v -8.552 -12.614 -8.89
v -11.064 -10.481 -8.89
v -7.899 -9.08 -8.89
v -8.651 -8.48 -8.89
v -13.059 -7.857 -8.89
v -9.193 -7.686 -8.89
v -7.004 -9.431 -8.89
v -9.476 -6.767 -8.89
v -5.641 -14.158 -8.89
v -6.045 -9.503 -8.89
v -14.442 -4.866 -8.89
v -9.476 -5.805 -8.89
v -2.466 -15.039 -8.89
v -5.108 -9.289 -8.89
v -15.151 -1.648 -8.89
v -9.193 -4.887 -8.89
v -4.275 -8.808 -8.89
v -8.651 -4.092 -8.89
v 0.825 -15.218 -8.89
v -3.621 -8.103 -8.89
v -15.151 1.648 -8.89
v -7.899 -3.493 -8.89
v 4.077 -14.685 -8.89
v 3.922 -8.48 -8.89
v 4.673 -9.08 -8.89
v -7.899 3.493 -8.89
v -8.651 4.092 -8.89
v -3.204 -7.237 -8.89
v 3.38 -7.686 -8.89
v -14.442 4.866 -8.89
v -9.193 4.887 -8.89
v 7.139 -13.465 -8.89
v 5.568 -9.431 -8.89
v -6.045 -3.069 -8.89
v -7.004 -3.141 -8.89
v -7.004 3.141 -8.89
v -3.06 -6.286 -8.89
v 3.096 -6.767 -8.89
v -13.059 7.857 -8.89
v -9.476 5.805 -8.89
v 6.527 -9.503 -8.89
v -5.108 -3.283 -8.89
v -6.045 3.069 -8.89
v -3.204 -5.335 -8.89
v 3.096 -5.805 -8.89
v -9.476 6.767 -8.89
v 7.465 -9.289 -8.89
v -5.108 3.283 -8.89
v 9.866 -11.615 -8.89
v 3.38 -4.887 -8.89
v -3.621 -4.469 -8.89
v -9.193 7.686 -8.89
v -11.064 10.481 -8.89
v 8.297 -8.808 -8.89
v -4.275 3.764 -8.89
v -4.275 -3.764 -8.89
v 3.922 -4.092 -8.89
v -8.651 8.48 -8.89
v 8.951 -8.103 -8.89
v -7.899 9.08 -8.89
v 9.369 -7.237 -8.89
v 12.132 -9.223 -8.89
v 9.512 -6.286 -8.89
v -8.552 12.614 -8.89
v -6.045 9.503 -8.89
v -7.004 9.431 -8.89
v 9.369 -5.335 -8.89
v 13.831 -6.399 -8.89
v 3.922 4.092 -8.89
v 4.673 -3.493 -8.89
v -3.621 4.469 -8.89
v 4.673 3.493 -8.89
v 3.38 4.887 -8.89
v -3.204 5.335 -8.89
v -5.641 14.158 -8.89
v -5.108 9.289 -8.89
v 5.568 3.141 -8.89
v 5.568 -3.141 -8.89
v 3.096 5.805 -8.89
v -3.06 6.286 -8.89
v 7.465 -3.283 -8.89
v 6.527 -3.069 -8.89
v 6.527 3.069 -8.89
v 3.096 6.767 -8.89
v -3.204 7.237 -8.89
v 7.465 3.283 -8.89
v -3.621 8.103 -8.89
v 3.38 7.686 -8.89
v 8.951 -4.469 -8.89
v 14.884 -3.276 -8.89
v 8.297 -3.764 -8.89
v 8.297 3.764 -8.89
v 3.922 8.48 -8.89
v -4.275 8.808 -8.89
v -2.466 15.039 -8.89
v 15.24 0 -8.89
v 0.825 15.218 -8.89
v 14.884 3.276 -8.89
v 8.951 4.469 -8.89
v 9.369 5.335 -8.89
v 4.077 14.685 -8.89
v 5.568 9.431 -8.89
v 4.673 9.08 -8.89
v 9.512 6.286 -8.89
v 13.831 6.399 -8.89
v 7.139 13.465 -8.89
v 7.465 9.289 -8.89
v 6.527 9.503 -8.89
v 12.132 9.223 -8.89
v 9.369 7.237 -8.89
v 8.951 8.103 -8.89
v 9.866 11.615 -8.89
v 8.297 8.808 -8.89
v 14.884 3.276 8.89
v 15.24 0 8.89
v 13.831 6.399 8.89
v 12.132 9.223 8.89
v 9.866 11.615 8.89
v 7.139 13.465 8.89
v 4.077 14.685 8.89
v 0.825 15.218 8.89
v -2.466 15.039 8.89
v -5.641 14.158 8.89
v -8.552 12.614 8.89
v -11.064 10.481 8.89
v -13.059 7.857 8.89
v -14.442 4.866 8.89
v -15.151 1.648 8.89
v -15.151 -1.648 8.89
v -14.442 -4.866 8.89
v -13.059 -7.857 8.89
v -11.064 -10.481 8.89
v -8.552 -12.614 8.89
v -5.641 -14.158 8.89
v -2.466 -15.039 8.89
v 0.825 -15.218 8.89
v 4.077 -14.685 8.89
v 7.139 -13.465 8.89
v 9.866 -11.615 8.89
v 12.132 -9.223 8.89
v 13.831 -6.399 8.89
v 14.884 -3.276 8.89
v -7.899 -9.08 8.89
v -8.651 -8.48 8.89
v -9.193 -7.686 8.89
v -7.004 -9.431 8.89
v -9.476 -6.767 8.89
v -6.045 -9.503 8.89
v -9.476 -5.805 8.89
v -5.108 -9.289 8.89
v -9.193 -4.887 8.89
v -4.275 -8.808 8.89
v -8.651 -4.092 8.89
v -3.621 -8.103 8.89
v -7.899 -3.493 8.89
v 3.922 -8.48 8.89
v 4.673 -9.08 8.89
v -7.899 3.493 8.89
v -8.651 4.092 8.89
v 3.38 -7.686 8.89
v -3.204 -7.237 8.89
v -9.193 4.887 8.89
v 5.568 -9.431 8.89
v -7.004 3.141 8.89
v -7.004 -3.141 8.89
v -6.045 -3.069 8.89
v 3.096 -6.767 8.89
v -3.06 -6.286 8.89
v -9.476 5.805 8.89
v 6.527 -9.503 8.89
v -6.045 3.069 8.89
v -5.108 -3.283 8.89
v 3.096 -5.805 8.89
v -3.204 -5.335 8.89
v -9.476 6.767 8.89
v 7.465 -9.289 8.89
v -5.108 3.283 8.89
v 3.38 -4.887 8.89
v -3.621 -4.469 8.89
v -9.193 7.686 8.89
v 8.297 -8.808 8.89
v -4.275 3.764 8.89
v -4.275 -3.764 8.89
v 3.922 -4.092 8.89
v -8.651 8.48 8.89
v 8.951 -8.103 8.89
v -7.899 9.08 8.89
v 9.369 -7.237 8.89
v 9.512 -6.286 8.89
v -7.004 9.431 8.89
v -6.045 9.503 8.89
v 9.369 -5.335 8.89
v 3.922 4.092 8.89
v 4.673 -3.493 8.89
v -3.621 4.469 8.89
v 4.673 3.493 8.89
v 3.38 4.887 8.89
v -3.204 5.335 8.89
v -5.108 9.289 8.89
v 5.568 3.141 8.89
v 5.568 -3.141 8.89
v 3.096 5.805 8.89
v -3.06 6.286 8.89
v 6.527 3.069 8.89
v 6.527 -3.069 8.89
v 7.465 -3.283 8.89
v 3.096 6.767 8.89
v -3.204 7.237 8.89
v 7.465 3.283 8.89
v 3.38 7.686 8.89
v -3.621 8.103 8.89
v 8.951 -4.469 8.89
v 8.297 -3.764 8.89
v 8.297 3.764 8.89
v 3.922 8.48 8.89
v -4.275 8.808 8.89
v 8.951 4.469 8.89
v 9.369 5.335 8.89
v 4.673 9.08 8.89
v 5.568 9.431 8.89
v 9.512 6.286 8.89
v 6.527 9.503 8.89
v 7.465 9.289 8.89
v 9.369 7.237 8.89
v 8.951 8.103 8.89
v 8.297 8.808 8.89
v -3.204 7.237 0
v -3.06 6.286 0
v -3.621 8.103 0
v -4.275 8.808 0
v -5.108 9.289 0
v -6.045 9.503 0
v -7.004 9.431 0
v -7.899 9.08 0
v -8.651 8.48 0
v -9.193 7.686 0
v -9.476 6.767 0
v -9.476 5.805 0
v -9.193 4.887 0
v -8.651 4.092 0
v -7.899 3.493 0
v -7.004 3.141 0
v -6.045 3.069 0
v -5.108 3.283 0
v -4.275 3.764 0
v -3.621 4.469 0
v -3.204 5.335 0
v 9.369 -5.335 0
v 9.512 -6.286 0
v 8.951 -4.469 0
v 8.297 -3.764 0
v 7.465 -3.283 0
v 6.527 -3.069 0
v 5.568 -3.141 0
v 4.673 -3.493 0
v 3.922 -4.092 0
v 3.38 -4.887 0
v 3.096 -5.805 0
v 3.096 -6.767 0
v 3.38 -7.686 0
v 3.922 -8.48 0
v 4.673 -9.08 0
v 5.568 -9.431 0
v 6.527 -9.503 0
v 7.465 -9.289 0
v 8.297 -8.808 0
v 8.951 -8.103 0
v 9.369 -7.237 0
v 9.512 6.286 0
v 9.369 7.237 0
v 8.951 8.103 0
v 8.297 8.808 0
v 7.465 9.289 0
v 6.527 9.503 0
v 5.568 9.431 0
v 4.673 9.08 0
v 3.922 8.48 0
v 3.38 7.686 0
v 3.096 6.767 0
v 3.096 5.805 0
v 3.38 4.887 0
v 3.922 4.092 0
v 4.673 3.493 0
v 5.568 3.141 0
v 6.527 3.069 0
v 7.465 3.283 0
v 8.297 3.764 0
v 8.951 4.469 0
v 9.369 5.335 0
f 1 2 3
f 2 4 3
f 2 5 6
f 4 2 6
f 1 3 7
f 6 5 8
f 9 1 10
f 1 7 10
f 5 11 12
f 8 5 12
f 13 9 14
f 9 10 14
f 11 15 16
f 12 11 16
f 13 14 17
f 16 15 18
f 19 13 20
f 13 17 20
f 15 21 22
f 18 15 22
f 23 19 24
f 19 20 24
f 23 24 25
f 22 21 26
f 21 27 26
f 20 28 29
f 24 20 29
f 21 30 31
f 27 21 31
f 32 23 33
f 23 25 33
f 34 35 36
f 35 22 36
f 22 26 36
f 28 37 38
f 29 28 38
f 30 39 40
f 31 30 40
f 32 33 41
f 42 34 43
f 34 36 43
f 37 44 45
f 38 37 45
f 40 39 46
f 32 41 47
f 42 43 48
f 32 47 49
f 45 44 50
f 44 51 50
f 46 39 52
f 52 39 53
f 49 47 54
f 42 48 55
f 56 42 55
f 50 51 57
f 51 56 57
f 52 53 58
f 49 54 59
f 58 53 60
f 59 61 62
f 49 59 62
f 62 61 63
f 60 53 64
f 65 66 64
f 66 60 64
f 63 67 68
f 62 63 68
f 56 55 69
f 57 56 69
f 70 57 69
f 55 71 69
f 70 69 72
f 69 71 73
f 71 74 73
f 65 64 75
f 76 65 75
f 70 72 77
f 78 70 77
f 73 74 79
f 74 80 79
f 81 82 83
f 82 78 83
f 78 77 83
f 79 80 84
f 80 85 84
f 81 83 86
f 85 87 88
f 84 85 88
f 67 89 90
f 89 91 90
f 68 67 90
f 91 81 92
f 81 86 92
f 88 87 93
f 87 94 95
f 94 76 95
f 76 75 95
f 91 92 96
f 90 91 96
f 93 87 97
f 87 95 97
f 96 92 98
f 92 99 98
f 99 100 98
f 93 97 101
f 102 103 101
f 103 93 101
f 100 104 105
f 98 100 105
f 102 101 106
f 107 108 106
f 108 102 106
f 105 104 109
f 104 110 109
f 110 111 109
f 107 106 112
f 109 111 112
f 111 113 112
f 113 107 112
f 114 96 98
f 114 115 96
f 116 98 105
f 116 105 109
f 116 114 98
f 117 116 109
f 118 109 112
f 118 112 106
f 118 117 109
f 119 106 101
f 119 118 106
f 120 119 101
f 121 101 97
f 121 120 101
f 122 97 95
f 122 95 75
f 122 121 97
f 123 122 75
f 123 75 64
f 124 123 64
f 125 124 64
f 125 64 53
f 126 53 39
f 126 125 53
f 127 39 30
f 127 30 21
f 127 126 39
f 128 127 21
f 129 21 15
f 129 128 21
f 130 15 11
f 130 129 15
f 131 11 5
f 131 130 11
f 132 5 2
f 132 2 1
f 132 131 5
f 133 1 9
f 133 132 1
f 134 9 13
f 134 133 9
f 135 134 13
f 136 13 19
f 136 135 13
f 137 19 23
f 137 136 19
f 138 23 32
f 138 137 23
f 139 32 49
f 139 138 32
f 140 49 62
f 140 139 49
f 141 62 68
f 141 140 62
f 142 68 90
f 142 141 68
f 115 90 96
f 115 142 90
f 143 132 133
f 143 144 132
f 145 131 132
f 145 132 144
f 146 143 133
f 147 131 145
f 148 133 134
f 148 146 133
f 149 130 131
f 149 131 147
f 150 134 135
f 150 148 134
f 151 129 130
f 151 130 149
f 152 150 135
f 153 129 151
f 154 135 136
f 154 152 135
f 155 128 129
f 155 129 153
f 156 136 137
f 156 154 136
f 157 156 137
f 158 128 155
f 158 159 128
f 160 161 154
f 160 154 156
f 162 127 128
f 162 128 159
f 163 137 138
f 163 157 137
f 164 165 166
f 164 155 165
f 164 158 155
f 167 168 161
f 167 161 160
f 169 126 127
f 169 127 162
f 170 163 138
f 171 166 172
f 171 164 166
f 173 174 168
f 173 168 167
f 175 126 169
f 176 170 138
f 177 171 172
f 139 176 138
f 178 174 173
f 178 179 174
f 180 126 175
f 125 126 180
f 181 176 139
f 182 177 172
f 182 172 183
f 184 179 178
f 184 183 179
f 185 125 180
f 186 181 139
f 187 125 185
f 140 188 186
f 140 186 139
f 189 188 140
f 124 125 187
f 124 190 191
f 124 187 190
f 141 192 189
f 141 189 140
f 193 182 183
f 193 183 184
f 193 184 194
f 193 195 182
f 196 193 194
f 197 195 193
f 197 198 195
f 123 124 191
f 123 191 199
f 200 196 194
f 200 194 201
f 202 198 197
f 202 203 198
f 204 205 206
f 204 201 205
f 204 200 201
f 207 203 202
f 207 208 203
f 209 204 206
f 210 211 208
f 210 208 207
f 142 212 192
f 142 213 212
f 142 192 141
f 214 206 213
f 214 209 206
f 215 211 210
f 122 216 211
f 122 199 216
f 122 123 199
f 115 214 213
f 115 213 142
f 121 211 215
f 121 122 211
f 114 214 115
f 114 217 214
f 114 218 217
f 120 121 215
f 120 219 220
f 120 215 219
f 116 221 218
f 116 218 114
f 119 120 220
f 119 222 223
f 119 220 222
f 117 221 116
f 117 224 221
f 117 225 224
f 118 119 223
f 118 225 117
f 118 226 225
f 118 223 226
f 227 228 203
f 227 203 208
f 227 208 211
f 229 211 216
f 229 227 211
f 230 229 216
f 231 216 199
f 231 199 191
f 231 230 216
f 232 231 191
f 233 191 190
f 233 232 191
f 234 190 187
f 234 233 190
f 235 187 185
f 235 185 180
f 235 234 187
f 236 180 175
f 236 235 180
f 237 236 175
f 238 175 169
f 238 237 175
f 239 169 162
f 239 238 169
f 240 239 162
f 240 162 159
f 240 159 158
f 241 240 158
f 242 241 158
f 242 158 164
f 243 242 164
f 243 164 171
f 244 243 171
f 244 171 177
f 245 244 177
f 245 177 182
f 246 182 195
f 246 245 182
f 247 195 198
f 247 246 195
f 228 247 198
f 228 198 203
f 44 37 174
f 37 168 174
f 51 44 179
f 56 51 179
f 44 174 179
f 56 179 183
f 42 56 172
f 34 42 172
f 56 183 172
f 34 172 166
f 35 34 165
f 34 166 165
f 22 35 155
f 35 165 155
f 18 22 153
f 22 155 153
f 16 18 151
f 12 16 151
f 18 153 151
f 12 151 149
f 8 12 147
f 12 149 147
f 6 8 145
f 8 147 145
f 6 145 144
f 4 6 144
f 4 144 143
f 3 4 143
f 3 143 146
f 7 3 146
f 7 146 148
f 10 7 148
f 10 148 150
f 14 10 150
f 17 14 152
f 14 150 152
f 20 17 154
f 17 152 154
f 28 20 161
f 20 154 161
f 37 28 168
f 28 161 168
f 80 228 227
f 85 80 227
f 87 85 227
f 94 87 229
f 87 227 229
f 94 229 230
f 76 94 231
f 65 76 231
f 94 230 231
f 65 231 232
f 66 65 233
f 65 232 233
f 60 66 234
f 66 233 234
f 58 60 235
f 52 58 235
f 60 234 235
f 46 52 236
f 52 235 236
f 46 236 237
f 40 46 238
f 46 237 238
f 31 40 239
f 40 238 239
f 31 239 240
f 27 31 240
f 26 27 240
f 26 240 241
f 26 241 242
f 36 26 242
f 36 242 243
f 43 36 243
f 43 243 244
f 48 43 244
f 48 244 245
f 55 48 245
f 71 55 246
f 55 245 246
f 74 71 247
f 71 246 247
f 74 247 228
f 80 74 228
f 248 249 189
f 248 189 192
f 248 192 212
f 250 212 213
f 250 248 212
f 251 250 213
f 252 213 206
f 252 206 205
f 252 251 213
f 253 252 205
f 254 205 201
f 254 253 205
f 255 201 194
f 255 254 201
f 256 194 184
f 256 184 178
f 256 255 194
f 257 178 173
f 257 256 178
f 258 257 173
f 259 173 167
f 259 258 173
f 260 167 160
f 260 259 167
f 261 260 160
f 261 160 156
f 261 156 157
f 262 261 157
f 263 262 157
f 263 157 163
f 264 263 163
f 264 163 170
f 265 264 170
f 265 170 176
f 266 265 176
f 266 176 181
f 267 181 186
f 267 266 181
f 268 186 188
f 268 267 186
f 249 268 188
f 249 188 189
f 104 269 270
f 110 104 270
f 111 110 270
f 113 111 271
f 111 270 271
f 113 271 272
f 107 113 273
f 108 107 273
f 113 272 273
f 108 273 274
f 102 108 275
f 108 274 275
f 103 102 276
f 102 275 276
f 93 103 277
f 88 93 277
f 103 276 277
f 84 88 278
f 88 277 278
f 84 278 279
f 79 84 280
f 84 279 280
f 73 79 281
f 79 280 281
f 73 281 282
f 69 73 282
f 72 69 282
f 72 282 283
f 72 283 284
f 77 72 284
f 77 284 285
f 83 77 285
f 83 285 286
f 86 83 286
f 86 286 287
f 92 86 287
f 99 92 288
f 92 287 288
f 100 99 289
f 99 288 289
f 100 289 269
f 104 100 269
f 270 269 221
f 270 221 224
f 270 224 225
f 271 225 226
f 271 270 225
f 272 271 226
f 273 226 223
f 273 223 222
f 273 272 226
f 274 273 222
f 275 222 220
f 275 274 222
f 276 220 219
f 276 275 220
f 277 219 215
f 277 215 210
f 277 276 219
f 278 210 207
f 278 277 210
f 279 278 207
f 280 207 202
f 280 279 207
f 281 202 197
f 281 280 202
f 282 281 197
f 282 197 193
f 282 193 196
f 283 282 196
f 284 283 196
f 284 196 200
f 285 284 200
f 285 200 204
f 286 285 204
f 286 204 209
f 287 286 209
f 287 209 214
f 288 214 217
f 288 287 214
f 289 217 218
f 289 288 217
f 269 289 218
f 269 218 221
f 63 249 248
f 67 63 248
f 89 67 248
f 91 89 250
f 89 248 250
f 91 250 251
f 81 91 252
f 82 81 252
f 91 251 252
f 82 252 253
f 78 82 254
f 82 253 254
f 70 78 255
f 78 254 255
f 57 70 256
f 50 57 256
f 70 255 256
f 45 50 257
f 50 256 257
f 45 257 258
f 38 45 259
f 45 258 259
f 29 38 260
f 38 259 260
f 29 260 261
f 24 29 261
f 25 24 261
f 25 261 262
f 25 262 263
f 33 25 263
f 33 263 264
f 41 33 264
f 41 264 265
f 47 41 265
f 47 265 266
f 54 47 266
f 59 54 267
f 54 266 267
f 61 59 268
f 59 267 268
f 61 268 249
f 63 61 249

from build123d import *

# Parameters (mm, degrees)
F0_R     = 15.24
F2_DEPTH = 8.89
F1_R     = 3.2258
F3_DEPTH = 8.89


with BuildPart() as f2:
    # F0 (on Top) → F2 (new body, symmetric)
    with BuildSketch(Plane.XY):
        Circle(F0_R)
    extrude(amount=F2_DEPTH, both=True)

    # F1 (on face) → F3 (cut, symmetric)
    with BuildSketch(Plane.XY):
        with Locations((6.286179, 6.286179)):
            Circle(F1_R)
        with Locations((-6.286179, 6.286179)):
            Circle(F1_R)
        with Locations((6.286179, -6.286179)):
            Circle(F1_R)
        with Locations((-6.286179, -6.286179)):
            Circle(F1_R)
    extrude(amount=F3_DEPTH, both=True, mode=Mode.SUBTRACT)


solid = f2.part
